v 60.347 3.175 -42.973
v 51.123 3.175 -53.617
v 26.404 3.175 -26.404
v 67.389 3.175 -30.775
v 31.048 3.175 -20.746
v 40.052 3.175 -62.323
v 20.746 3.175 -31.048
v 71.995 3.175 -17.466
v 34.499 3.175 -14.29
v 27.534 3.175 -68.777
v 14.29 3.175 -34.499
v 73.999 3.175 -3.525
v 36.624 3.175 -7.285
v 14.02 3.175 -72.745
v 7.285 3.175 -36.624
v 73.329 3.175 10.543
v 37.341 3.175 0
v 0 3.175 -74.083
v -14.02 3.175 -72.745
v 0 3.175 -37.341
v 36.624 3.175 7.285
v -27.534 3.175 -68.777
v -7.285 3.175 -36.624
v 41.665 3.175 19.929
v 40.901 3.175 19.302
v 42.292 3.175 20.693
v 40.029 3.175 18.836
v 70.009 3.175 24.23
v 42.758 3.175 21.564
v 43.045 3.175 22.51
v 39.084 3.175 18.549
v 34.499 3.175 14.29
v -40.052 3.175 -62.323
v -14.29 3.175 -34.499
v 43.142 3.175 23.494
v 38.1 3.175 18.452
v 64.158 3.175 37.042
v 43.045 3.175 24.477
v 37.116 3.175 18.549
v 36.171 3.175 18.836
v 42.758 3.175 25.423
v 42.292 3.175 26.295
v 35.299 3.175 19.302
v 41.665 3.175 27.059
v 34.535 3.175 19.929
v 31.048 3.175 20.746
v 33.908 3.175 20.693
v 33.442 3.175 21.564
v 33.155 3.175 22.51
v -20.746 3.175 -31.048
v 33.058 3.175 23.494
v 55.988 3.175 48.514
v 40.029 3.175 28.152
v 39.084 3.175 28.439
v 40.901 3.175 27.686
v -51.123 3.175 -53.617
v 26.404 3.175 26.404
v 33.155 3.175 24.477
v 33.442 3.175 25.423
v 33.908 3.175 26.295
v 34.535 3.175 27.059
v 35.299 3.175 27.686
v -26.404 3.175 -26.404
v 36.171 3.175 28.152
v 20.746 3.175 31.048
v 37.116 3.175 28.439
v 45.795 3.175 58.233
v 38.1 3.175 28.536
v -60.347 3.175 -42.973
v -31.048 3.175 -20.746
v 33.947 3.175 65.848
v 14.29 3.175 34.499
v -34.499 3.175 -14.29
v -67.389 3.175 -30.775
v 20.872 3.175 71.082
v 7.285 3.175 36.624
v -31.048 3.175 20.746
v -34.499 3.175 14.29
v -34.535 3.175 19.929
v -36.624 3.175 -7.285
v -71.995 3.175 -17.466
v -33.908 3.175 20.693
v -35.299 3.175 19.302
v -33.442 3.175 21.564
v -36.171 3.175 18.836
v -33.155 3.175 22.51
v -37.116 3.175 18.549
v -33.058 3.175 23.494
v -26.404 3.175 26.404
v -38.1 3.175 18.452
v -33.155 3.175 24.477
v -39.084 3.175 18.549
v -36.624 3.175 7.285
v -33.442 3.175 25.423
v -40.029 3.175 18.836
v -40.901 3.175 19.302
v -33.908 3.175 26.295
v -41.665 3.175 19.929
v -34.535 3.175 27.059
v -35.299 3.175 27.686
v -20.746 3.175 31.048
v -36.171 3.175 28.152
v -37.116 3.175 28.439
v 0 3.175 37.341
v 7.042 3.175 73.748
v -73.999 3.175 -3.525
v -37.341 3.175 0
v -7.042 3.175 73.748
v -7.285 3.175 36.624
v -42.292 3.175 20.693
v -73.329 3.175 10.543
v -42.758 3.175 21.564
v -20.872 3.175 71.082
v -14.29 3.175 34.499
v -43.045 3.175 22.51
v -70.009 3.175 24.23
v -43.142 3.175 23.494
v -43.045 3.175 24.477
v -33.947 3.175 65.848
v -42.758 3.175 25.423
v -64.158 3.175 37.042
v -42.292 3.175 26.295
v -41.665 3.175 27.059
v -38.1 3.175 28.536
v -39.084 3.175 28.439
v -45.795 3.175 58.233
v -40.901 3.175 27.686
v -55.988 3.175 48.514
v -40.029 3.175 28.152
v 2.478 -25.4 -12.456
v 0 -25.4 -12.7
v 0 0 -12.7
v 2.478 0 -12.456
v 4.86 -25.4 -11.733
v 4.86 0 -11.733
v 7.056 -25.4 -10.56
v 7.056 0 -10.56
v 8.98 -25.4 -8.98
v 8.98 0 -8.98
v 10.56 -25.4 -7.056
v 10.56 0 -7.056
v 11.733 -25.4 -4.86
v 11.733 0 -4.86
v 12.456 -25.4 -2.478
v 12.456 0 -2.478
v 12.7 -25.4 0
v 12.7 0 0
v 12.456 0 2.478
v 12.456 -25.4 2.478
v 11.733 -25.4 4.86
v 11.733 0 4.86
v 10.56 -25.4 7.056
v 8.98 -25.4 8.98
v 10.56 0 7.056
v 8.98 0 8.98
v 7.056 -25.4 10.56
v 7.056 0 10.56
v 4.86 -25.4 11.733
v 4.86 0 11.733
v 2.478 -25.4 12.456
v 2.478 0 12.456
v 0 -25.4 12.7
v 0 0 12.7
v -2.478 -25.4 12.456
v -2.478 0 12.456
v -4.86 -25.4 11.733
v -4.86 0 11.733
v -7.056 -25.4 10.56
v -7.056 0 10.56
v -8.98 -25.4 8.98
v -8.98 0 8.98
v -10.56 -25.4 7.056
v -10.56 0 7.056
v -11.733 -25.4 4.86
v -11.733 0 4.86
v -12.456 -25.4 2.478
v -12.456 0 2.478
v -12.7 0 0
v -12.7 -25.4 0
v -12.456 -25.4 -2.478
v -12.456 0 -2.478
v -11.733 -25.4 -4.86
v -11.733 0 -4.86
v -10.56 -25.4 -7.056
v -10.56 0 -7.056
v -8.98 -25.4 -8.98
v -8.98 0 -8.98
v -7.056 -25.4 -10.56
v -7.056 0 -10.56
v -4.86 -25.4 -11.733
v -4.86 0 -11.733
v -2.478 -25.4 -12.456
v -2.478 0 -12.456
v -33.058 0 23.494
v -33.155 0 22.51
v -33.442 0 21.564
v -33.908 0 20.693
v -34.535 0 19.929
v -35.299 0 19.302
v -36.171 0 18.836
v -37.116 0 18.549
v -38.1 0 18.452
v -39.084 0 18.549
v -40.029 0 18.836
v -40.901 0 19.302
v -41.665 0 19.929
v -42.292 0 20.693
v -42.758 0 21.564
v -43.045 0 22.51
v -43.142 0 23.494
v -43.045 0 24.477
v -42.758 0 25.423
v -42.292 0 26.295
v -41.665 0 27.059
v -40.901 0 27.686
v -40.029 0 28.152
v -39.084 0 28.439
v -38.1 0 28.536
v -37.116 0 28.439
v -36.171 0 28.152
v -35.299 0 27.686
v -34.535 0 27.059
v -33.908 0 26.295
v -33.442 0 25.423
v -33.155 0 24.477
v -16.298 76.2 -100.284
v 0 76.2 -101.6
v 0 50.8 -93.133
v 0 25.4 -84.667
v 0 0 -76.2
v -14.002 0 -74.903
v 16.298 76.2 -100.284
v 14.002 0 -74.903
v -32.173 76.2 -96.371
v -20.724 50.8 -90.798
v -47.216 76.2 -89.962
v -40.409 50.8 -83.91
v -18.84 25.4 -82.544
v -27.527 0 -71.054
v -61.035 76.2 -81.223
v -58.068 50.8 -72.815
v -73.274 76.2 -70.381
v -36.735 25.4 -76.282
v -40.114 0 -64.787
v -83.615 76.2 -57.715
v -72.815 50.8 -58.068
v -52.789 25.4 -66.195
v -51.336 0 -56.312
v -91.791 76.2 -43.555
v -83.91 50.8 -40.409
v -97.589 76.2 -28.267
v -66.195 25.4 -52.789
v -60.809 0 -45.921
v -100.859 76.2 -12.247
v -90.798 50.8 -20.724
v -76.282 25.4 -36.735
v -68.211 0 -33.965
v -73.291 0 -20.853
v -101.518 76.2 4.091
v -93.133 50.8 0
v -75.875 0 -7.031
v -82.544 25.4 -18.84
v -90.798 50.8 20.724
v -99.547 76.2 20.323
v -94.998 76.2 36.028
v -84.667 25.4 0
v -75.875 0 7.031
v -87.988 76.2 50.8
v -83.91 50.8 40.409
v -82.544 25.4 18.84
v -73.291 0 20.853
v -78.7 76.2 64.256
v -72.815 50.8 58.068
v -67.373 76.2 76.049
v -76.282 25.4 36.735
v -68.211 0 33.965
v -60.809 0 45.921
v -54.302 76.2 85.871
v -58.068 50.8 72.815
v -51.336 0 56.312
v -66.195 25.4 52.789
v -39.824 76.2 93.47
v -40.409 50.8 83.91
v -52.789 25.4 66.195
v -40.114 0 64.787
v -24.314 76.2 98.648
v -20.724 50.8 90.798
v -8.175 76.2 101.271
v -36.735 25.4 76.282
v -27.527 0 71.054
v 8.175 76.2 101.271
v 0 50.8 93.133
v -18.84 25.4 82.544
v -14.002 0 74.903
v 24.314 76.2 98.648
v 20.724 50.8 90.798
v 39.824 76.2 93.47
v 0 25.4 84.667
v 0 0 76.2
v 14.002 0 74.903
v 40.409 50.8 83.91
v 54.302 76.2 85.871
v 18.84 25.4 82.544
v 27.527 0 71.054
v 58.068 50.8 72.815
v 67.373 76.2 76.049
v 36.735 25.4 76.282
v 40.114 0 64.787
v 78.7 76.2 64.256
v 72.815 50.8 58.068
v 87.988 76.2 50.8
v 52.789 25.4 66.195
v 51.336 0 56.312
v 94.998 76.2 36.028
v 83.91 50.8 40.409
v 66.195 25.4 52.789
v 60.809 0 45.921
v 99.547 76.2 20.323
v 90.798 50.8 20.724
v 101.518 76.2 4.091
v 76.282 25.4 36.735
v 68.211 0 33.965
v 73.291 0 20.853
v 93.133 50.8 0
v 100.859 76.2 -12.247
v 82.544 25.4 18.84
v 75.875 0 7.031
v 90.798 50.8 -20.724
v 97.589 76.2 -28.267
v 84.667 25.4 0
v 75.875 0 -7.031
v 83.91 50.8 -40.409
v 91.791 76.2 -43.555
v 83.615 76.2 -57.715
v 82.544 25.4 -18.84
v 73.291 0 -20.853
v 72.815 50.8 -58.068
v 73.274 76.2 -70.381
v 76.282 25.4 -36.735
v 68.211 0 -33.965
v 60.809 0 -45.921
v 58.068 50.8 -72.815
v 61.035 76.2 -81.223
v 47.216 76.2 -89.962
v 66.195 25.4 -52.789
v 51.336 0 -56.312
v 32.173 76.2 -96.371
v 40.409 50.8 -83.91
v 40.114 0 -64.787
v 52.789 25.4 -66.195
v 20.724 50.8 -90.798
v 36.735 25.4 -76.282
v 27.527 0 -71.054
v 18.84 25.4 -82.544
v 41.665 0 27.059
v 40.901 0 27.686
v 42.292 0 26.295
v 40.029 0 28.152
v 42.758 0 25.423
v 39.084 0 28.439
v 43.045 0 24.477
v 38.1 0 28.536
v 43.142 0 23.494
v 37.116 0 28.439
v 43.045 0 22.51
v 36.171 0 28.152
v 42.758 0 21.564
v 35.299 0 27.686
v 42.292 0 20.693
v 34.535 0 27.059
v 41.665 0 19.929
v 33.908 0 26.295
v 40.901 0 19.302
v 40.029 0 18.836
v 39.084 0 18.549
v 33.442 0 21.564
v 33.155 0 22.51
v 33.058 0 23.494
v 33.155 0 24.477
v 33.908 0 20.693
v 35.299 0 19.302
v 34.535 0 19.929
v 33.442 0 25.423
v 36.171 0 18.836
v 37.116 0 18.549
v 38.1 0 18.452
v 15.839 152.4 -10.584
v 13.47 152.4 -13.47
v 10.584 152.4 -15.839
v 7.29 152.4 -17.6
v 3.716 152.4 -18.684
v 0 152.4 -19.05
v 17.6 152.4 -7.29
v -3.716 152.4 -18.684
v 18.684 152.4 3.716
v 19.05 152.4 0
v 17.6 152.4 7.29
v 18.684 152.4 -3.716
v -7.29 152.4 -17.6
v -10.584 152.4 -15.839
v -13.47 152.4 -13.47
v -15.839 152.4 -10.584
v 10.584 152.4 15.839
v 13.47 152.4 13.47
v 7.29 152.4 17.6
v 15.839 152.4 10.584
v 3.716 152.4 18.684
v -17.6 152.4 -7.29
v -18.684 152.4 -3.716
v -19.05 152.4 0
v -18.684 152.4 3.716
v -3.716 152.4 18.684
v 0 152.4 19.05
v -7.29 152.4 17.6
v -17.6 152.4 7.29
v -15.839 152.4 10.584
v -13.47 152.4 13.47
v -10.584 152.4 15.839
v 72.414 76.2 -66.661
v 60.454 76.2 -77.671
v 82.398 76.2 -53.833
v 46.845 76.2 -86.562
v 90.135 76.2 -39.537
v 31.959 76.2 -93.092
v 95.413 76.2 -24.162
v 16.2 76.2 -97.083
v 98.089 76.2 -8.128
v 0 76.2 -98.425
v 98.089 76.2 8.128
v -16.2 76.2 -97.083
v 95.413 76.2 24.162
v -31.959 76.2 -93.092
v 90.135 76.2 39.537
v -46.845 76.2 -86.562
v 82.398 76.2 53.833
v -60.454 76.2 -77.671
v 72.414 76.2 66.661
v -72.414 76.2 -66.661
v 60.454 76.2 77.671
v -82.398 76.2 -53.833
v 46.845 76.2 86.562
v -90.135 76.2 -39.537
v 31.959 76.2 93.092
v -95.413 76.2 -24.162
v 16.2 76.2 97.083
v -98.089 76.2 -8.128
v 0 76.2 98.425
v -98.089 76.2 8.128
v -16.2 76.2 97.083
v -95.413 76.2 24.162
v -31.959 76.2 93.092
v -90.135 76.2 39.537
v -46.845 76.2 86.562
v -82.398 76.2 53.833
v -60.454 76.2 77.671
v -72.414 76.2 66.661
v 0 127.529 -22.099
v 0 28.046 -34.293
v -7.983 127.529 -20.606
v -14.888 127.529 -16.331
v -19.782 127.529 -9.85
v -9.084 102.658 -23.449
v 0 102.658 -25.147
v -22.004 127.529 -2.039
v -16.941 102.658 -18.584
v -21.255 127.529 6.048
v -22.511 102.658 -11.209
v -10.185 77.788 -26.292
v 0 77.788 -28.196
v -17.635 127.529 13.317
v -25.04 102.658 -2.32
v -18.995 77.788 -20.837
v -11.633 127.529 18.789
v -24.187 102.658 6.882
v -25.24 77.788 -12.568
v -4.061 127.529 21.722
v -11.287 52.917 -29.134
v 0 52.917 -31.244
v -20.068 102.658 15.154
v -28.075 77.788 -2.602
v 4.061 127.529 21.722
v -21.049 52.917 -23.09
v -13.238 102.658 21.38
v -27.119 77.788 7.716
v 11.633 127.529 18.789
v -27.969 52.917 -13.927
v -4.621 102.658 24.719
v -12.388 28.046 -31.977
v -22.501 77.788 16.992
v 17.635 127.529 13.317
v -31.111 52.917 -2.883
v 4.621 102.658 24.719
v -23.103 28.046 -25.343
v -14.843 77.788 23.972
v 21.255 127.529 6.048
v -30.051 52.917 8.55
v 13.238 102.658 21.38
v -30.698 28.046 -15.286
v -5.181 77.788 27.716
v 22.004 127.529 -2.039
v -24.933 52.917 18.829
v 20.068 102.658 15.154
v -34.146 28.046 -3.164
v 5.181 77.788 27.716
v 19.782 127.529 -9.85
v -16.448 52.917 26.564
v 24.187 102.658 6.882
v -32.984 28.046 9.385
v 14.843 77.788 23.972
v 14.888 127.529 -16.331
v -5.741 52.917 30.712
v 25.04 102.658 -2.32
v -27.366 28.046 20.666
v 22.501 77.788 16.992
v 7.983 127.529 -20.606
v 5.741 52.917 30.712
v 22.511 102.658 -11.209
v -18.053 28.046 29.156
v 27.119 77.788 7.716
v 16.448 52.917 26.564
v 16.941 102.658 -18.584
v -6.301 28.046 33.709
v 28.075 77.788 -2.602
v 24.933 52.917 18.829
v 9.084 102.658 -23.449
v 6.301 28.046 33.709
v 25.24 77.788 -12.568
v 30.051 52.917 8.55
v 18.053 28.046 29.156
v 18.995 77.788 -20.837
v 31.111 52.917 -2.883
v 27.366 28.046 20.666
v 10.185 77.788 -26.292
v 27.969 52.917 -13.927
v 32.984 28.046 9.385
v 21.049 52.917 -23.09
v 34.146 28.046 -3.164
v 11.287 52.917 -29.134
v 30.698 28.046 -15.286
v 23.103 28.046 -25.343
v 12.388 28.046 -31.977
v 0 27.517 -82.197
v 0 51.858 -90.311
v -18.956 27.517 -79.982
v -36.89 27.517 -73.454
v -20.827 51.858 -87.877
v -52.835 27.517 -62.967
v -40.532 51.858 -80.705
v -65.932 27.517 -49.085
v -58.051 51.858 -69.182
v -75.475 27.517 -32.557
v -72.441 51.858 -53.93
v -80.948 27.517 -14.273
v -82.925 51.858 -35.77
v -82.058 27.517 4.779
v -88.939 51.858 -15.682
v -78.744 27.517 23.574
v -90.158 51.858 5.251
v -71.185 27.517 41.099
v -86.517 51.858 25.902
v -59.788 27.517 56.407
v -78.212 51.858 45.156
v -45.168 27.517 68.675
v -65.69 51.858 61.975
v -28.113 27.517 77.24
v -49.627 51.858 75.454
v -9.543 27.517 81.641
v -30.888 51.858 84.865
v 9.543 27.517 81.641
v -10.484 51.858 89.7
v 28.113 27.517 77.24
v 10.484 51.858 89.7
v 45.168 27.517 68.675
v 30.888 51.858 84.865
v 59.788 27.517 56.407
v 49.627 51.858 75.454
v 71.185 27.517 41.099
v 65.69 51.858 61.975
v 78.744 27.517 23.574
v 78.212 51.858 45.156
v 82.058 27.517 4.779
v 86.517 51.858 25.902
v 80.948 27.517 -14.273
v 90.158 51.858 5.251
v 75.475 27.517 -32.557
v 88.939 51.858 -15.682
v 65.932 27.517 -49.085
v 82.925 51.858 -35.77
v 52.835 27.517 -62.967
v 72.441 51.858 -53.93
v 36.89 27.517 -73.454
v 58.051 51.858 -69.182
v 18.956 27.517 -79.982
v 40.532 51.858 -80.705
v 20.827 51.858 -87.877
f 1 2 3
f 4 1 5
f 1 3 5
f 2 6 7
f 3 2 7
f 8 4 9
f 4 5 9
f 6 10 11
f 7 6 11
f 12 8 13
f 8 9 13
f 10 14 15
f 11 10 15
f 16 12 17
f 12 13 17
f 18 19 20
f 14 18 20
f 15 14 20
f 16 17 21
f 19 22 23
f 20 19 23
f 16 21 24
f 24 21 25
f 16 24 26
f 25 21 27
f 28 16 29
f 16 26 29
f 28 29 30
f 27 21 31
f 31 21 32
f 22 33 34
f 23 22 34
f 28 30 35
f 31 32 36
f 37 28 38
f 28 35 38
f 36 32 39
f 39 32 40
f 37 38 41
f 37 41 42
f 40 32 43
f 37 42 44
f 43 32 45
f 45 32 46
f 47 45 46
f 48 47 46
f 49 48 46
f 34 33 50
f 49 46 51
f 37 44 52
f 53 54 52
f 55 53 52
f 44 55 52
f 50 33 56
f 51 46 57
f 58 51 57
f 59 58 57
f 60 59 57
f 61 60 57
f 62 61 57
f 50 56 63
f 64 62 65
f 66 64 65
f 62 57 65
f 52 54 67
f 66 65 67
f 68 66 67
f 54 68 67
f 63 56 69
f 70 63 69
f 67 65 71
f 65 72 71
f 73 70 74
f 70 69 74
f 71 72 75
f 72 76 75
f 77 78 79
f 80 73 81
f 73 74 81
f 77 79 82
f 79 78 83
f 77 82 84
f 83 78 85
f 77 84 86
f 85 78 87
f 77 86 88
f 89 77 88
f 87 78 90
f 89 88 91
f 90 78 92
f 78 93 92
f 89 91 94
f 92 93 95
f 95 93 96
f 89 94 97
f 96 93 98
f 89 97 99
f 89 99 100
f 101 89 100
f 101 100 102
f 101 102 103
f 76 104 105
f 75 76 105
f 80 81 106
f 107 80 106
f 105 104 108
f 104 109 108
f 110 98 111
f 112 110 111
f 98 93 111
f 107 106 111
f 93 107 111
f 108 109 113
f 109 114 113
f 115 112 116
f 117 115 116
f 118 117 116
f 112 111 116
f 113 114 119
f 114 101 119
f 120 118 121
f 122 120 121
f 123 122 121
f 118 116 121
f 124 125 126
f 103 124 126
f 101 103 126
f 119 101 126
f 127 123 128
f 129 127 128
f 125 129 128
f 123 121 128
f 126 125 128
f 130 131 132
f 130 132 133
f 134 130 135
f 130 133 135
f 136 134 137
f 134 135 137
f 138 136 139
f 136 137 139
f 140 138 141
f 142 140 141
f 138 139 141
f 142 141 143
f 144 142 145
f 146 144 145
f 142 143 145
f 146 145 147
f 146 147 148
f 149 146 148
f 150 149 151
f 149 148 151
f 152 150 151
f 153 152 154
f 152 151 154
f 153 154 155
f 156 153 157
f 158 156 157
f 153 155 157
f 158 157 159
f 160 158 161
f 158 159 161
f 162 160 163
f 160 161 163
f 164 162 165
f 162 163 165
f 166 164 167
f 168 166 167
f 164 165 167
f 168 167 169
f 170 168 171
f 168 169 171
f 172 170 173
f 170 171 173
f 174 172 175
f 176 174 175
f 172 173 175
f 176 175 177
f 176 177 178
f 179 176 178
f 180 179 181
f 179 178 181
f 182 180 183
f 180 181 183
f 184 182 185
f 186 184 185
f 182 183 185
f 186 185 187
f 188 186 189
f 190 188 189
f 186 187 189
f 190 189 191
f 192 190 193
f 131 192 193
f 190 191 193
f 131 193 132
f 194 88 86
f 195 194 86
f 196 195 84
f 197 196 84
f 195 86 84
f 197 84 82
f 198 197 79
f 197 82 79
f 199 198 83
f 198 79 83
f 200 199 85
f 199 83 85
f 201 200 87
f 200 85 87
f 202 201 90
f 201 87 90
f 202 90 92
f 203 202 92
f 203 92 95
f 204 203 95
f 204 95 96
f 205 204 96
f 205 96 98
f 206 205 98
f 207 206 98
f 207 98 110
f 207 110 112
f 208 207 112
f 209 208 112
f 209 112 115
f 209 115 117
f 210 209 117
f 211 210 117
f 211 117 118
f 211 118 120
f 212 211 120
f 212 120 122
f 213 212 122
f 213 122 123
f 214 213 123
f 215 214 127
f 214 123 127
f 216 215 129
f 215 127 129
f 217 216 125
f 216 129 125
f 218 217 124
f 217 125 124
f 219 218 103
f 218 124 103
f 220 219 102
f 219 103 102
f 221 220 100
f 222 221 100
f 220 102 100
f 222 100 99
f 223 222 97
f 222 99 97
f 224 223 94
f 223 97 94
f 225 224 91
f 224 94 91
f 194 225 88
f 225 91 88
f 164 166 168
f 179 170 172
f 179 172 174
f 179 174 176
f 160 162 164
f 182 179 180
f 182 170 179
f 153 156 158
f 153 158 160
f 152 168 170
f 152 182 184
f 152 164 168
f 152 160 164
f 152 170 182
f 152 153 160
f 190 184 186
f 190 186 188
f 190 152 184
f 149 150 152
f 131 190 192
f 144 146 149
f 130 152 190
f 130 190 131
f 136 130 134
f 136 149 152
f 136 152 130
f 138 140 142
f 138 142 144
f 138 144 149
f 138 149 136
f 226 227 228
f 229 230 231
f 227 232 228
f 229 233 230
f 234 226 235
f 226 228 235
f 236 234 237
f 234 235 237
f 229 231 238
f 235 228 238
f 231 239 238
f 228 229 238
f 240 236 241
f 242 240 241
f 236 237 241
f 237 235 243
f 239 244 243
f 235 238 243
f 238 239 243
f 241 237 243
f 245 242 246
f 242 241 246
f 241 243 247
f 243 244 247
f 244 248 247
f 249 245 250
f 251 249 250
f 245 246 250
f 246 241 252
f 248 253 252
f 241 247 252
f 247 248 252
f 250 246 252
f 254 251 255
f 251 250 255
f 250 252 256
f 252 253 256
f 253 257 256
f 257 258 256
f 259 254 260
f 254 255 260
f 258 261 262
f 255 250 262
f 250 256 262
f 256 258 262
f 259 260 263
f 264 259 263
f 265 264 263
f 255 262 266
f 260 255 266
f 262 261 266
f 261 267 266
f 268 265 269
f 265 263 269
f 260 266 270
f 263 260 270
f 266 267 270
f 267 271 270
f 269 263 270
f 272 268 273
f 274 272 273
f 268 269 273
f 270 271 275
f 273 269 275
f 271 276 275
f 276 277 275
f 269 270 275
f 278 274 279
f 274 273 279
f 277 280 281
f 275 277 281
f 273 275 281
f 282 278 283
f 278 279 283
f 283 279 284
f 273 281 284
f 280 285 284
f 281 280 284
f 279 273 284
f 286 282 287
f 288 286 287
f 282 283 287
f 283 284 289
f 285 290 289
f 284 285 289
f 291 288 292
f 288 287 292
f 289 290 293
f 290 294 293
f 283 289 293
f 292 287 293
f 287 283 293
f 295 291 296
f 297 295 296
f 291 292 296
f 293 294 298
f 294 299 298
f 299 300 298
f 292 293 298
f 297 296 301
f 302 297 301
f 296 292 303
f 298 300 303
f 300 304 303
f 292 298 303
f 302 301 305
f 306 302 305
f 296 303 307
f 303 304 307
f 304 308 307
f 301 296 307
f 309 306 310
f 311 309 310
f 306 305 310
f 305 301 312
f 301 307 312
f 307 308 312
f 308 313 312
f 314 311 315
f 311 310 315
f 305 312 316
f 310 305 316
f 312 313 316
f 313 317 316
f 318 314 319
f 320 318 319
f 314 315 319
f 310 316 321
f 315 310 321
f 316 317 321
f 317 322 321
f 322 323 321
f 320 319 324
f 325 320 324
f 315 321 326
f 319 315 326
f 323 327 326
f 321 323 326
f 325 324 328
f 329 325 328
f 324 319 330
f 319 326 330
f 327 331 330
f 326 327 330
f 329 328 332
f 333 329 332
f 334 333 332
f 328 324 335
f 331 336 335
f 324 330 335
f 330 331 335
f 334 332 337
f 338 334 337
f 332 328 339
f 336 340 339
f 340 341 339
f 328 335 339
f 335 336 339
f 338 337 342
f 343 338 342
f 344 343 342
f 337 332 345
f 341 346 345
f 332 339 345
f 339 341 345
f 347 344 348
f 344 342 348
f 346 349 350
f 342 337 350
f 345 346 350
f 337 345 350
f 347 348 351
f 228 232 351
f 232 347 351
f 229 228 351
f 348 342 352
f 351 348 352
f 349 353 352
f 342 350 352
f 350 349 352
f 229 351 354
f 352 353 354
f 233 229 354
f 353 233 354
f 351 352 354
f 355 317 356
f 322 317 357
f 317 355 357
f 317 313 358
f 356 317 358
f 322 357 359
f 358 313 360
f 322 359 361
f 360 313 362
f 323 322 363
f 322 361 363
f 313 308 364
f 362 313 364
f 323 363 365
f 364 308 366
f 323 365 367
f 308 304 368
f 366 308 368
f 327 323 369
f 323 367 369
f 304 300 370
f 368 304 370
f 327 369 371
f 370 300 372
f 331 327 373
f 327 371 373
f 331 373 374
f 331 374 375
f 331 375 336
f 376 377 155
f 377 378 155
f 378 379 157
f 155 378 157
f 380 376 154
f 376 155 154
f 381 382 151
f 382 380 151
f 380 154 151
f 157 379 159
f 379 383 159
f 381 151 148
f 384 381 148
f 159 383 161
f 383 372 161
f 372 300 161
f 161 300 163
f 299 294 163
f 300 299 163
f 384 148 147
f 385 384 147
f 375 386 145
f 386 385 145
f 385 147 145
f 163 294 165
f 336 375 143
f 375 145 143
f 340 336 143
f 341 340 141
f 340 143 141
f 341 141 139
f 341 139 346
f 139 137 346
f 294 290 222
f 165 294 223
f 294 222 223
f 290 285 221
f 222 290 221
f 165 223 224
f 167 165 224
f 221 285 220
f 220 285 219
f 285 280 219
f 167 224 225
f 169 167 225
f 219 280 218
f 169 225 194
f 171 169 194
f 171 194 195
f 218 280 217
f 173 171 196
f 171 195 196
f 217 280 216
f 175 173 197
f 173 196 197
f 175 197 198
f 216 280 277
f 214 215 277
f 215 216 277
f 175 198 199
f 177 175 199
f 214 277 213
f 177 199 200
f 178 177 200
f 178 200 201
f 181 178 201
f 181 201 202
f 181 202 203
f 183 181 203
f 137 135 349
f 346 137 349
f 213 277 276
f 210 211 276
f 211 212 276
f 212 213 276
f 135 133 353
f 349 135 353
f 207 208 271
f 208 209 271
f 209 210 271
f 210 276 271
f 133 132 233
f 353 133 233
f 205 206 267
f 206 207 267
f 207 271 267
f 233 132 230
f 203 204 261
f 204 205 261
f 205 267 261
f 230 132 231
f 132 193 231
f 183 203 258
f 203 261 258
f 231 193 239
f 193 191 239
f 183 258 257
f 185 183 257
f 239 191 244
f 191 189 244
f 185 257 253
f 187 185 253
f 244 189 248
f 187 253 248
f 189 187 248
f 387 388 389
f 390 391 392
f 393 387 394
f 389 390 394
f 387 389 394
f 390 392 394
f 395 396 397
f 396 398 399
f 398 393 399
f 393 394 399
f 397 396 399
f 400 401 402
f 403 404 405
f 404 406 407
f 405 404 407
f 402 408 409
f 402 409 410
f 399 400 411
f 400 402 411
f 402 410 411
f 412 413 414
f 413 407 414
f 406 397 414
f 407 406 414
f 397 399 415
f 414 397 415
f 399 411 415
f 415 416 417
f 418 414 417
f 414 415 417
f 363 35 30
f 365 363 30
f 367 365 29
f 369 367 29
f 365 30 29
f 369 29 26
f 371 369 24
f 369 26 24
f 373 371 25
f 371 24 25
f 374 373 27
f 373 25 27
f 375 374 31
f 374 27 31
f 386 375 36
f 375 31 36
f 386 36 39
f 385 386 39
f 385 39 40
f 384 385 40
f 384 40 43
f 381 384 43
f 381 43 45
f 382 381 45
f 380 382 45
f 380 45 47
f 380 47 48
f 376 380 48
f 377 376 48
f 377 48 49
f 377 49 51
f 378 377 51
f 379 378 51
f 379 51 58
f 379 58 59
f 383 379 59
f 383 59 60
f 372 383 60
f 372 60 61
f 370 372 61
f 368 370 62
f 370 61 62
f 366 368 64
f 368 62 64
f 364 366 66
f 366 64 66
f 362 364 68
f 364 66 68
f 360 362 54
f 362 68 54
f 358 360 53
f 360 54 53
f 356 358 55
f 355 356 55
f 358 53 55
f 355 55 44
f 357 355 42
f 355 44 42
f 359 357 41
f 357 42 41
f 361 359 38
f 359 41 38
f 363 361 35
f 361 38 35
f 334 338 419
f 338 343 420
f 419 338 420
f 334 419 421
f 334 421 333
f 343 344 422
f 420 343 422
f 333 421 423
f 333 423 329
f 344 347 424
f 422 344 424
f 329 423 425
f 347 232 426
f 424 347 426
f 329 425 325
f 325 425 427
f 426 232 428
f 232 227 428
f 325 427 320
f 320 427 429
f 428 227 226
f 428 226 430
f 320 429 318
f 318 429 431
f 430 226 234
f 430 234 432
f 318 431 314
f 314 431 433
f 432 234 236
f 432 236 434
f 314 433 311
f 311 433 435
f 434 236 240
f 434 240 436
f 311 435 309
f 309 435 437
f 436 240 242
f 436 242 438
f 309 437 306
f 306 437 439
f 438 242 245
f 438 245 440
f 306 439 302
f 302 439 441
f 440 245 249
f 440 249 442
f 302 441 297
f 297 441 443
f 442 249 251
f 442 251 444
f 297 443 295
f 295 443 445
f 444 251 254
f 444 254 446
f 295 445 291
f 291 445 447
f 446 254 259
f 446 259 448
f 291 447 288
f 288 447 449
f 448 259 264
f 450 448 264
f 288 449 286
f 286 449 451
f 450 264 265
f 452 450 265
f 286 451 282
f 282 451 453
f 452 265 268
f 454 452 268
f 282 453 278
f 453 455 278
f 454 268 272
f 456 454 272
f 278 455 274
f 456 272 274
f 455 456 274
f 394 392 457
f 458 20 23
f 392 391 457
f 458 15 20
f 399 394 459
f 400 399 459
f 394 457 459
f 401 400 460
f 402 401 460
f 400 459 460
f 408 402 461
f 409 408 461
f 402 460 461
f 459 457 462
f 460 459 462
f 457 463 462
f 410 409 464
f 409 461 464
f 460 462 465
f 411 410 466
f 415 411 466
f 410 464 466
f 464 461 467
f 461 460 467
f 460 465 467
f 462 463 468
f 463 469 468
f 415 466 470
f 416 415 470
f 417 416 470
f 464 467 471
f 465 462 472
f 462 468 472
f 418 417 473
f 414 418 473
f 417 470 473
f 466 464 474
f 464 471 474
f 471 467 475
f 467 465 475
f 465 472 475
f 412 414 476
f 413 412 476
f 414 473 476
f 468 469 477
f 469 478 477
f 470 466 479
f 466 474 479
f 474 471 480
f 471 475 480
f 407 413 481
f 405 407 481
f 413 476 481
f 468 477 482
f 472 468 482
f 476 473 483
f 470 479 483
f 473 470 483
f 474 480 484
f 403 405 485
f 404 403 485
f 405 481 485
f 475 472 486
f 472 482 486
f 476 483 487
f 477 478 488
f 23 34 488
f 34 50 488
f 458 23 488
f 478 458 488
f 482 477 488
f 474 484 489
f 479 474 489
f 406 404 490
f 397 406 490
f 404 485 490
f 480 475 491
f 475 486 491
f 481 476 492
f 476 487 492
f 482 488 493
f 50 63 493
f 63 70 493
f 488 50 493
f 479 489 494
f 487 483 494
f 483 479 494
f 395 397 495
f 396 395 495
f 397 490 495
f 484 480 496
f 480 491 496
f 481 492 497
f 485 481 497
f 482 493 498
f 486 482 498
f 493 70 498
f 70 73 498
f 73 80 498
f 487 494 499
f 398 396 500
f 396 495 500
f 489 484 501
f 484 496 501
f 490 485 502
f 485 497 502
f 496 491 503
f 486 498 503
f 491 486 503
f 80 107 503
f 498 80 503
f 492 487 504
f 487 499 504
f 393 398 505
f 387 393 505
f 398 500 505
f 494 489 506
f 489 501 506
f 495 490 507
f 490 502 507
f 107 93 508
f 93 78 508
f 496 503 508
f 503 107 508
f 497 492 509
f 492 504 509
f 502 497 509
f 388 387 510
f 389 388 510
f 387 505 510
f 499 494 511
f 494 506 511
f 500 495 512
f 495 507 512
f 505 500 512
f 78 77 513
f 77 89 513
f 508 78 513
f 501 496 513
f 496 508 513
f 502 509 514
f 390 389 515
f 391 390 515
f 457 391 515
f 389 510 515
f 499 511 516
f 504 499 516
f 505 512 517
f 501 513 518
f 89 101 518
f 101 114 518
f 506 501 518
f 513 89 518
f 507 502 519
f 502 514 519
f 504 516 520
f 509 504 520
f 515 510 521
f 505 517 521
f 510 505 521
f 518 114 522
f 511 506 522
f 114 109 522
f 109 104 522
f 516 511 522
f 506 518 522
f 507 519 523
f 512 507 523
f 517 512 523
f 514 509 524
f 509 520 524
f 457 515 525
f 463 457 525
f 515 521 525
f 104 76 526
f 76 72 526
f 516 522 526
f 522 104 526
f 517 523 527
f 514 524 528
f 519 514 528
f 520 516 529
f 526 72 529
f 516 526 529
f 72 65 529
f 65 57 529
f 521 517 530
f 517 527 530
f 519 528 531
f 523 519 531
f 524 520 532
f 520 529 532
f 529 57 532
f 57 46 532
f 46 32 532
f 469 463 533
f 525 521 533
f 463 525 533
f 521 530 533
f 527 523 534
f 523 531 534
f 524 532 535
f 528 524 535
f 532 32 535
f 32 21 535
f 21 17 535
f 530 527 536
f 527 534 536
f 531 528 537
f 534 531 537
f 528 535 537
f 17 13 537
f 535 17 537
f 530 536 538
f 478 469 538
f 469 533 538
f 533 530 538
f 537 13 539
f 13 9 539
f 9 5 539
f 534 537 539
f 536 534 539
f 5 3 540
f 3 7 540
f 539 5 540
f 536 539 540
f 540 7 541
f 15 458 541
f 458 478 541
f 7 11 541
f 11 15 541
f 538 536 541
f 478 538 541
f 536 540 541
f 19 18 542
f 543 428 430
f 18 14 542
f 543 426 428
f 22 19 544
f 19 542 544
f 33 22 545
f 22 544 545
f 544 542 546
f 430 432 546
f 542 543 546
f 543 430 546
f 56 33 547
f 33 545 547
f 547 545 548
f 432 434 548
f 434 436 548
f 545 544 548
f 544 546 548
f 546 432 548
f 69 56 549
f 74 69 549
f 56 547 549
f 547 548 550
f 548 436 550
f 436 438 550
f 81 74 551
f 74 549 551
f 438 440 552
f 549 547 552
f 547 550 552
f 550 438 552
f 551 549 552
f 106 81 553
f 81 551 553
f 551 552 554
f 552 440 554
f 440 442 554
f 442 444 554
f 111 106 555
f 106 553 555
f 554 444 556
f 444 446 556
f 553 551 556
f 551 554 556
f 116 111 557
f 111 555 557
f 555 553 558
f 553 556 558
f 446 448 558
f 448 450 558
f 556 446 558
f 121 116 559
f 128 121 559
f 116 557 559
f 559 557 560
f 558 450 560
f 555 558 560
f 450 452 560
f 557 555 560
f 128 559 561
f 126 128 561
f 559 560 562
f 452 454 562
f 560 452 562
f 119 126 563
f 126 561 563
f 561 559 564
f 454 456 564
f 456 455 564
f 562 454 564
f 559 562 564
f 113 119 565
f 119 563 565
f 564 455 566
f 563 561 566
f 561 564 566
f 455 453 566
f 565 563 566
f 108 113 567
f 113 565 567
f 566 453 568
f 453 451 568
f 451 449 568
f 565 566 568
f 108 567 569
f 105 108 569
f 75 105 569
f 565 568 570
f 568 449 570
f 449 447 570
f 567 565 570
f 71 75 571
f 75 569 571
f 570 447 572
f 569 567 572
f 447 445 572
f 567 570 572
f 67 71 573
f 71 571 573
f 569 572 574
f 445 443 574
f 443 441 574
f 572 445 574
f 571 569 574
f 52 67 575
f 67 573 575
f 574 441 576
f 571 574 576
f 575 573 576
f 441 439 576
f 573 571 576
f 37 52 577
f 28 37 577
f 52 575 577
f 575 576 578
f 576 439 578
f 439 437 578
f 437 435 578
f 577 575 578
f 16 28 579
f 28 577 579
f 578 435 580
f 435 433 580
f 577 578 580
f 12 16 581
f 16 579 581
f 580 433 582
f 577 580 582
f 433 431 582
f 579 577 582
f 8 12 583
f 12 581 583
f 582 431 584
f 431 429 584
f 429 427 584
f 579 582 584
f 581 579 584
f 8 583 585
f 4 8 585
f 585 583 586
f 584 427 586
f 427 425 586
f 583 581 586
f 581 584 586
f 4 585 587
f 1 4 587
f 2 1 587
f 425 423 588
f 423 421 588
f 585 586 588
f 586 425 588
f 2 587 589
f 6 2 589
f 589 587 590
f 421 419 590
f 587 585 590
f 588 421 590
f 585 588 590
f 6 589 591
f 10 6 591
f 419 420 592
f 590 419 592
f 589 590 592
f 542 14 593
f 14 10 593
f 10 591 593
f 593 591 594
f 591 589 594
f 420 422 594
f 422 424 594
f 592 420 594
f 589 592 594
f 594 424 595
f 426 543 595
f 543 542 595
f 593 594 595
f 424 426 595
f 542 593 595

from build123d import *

# Parameters (mm, degrees)
F_3_8_CLEARANCE_HOLE1_D = 10.0838
SKETCH2_R               = 12.7
RF_CONNECTOR_DEPTH      = 25.4


with BuildPart() as part:
    # Sketch1 → Revolve1 (revolve)
    with BuildSketch(Plane.XY, mode=Mode.PRIVATE) as revolve1_sk:
        Polygon((0, 152.4), (19.05, 152.4), (37.34122006, 3.175), (74.083333333, 3.175), (98.425, 76.2), (101.6, 76.2), (76.2, 0), (0, 0), align=None)
    revolve(revolve1_sk.sketch.rotate(Axis((0, 0, 0), (0, 1, 0)), 90), axis=Axis((0, 0, 0), (0, 1, 0)))

    # 3/8 Clearance Hole1 (through all)
    with Locations(Plane(origin=(0, 0, 0), x_dir=(-1, 0, 0), z_dir=(0, -1, 0))):
        with Locations((38.1, -23.493790612), (-38.1, -23.493790612)):
            Hole(F_3_8_CLEARANCE_HOLE1_D / 2)

    # Sketch2 → RF Connector (add)
    with BuildSketch(Plane.XZ):
        with Locations(Location((0, 0, 0), (0, 0, 270))):
            Circle(SKETCH2_R)
    extrude(amount=RF_CONNECTOR_DEPTH)


solid = part.part
